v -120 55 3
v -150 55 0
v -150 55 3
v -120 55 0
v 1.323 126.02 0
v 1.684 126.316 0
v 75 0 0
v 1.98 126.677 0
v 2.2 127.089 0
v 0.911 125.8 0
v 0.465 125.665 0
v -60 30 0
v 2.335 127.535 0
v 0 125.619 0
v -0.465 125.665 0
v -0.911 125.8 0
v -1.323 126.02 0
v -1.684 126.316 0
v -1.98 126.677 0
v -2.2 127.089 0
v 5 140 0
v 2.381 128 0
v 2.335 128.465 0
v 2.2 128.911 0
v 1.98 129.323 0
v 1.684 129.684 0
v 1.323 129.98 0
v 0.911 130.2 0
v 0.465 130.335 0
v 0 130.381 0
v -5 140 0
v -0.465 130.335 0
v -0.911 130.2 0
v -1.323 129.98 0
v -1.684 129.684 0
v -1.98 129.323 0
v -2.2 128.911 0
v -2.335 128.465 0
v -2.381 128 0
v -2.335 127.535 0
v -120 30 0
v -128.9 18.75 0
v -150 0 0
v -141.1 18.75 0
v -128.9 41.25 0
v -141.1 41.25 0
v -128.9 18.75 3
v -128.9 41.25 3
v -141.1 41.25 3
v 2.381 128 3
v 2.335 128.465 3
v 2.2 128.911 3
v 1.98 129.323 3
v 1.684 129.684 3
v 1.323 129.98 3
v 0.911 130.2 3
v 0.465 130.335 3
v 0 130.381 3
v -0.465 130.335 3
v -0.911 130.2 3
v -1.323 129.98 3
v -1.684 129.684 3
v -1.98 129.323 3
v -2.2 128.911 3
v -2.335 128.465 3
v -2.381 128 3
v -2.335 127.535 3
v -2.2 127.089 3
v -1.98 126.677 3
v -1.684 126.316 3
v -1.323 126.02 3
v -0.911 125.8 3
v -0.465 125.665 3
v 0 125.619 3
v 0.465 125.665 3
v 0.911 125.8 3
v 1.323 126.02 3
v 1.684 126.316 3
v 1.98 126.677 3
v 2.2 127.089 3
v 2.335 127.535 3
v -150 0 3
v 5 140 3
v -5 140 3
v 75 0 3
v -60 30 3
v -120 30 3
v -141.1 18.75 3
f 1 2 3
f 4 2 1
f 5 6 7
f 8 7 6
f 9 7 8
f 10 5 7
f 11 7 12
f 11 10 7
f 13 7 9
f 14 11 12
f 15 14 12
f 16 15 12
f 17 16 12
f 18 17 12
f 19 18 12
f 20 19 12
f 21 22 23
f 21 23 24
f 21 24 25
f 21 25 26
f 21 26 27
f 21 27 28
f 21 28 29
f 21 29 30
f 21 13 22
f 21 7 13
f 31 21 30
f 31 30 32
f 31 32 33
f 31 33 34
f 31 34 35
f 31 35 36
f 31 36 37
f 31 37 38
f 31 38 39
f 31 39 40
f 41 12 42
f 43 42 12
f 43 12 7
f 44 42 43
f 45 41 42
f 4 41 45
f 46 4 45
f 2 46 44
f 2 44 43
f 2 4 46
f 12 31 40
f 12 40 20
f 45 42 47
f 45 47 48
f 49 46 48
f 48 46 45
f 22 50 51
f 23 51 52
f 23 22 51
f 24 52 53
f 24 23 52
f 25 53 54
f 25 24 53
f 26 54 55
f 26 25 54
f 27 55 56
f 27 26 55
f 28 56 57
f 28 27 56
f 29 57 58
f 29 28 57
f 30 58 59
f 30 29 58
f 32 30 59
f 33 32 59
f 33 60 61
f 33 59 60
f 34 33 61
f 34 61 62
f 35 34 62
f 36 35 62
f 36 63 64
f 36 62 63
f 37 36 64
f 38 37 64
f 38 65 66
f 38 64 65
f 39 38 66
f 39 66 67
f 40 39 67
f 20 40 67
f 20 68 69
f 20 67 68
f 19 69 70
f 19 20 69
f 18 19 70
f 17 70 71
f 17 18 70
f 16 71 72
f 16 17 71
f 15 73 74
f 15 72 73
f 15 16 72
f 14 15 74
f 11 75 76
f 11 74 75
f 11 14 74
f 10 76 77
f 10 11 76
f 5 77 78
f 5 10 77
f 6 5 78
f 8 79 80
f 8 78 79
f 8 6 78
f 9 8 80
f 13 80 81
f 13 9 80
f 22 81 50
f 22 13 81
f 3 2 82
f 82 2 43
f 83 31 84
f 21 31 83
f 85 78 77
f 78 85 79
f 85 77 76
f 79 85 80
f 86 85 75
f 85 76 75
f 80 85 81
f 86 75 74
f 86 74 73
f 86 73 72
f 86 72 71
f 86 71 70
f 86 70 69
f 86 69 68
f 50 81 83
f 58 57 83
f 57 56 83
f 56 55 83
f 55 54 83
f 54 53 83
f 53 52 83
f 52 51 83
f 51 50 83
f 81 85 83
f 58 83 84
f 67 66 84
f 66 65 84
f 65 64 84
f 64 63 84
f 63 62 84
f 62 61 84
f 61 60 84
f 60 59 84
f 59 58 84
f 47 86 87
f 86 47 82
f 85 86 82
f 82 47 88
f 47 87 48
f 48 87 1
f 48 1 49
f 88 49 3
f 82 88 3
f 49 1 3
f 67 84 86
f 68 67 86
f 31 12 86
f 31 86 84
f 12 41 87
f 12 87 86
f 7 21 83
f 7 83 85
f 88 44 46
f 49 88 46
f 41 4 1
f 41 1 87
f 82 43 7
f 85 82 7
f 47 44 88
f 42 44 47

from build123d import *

# Parameters (mm, degrees)
CROQUIS1_W              = 12.2
CROQUIS1_H              = 22.5
SALIENTE_EXTRUIR1_DEPTH = 3
CROQUIS2_R              = 2.38125
CORTAR_EXTRUIR1_DEPTH   = 4


with BuildPart() as part:
    # Croquis1 → Saliente-Extruir1 (new body)
    with BuildSketch(Plane.XY):
        Polygon((75, 0), (-75, 0), (-150, 0), (-150, 30), (-150, 55), (-120, 55), (-120, 30), (-60, 30), (0, 150), align=None)
        with Locations((-135, 30)):
            Rectangle(CROQUIS1_W, CROQUIS1_H, mode=Mode.SUBTRACT)
    extrude(amount=SALIENTE_EXTRUIR1_DEPTH)

    # Croquis2 → Cortar-Extruir1 (cut, through all)
    with BuildSketch(Plane.XY):
        with Locations((0, 128)):
            Circle(CROQUIS2_R)
        Polygon((5, 140), (0, 150), (-5, 140), align=None)
    extrude(amount=CORTAR_EXTRUIR1_DEPTH, mode=Mode.SUBTRACT)


solid = part.part
